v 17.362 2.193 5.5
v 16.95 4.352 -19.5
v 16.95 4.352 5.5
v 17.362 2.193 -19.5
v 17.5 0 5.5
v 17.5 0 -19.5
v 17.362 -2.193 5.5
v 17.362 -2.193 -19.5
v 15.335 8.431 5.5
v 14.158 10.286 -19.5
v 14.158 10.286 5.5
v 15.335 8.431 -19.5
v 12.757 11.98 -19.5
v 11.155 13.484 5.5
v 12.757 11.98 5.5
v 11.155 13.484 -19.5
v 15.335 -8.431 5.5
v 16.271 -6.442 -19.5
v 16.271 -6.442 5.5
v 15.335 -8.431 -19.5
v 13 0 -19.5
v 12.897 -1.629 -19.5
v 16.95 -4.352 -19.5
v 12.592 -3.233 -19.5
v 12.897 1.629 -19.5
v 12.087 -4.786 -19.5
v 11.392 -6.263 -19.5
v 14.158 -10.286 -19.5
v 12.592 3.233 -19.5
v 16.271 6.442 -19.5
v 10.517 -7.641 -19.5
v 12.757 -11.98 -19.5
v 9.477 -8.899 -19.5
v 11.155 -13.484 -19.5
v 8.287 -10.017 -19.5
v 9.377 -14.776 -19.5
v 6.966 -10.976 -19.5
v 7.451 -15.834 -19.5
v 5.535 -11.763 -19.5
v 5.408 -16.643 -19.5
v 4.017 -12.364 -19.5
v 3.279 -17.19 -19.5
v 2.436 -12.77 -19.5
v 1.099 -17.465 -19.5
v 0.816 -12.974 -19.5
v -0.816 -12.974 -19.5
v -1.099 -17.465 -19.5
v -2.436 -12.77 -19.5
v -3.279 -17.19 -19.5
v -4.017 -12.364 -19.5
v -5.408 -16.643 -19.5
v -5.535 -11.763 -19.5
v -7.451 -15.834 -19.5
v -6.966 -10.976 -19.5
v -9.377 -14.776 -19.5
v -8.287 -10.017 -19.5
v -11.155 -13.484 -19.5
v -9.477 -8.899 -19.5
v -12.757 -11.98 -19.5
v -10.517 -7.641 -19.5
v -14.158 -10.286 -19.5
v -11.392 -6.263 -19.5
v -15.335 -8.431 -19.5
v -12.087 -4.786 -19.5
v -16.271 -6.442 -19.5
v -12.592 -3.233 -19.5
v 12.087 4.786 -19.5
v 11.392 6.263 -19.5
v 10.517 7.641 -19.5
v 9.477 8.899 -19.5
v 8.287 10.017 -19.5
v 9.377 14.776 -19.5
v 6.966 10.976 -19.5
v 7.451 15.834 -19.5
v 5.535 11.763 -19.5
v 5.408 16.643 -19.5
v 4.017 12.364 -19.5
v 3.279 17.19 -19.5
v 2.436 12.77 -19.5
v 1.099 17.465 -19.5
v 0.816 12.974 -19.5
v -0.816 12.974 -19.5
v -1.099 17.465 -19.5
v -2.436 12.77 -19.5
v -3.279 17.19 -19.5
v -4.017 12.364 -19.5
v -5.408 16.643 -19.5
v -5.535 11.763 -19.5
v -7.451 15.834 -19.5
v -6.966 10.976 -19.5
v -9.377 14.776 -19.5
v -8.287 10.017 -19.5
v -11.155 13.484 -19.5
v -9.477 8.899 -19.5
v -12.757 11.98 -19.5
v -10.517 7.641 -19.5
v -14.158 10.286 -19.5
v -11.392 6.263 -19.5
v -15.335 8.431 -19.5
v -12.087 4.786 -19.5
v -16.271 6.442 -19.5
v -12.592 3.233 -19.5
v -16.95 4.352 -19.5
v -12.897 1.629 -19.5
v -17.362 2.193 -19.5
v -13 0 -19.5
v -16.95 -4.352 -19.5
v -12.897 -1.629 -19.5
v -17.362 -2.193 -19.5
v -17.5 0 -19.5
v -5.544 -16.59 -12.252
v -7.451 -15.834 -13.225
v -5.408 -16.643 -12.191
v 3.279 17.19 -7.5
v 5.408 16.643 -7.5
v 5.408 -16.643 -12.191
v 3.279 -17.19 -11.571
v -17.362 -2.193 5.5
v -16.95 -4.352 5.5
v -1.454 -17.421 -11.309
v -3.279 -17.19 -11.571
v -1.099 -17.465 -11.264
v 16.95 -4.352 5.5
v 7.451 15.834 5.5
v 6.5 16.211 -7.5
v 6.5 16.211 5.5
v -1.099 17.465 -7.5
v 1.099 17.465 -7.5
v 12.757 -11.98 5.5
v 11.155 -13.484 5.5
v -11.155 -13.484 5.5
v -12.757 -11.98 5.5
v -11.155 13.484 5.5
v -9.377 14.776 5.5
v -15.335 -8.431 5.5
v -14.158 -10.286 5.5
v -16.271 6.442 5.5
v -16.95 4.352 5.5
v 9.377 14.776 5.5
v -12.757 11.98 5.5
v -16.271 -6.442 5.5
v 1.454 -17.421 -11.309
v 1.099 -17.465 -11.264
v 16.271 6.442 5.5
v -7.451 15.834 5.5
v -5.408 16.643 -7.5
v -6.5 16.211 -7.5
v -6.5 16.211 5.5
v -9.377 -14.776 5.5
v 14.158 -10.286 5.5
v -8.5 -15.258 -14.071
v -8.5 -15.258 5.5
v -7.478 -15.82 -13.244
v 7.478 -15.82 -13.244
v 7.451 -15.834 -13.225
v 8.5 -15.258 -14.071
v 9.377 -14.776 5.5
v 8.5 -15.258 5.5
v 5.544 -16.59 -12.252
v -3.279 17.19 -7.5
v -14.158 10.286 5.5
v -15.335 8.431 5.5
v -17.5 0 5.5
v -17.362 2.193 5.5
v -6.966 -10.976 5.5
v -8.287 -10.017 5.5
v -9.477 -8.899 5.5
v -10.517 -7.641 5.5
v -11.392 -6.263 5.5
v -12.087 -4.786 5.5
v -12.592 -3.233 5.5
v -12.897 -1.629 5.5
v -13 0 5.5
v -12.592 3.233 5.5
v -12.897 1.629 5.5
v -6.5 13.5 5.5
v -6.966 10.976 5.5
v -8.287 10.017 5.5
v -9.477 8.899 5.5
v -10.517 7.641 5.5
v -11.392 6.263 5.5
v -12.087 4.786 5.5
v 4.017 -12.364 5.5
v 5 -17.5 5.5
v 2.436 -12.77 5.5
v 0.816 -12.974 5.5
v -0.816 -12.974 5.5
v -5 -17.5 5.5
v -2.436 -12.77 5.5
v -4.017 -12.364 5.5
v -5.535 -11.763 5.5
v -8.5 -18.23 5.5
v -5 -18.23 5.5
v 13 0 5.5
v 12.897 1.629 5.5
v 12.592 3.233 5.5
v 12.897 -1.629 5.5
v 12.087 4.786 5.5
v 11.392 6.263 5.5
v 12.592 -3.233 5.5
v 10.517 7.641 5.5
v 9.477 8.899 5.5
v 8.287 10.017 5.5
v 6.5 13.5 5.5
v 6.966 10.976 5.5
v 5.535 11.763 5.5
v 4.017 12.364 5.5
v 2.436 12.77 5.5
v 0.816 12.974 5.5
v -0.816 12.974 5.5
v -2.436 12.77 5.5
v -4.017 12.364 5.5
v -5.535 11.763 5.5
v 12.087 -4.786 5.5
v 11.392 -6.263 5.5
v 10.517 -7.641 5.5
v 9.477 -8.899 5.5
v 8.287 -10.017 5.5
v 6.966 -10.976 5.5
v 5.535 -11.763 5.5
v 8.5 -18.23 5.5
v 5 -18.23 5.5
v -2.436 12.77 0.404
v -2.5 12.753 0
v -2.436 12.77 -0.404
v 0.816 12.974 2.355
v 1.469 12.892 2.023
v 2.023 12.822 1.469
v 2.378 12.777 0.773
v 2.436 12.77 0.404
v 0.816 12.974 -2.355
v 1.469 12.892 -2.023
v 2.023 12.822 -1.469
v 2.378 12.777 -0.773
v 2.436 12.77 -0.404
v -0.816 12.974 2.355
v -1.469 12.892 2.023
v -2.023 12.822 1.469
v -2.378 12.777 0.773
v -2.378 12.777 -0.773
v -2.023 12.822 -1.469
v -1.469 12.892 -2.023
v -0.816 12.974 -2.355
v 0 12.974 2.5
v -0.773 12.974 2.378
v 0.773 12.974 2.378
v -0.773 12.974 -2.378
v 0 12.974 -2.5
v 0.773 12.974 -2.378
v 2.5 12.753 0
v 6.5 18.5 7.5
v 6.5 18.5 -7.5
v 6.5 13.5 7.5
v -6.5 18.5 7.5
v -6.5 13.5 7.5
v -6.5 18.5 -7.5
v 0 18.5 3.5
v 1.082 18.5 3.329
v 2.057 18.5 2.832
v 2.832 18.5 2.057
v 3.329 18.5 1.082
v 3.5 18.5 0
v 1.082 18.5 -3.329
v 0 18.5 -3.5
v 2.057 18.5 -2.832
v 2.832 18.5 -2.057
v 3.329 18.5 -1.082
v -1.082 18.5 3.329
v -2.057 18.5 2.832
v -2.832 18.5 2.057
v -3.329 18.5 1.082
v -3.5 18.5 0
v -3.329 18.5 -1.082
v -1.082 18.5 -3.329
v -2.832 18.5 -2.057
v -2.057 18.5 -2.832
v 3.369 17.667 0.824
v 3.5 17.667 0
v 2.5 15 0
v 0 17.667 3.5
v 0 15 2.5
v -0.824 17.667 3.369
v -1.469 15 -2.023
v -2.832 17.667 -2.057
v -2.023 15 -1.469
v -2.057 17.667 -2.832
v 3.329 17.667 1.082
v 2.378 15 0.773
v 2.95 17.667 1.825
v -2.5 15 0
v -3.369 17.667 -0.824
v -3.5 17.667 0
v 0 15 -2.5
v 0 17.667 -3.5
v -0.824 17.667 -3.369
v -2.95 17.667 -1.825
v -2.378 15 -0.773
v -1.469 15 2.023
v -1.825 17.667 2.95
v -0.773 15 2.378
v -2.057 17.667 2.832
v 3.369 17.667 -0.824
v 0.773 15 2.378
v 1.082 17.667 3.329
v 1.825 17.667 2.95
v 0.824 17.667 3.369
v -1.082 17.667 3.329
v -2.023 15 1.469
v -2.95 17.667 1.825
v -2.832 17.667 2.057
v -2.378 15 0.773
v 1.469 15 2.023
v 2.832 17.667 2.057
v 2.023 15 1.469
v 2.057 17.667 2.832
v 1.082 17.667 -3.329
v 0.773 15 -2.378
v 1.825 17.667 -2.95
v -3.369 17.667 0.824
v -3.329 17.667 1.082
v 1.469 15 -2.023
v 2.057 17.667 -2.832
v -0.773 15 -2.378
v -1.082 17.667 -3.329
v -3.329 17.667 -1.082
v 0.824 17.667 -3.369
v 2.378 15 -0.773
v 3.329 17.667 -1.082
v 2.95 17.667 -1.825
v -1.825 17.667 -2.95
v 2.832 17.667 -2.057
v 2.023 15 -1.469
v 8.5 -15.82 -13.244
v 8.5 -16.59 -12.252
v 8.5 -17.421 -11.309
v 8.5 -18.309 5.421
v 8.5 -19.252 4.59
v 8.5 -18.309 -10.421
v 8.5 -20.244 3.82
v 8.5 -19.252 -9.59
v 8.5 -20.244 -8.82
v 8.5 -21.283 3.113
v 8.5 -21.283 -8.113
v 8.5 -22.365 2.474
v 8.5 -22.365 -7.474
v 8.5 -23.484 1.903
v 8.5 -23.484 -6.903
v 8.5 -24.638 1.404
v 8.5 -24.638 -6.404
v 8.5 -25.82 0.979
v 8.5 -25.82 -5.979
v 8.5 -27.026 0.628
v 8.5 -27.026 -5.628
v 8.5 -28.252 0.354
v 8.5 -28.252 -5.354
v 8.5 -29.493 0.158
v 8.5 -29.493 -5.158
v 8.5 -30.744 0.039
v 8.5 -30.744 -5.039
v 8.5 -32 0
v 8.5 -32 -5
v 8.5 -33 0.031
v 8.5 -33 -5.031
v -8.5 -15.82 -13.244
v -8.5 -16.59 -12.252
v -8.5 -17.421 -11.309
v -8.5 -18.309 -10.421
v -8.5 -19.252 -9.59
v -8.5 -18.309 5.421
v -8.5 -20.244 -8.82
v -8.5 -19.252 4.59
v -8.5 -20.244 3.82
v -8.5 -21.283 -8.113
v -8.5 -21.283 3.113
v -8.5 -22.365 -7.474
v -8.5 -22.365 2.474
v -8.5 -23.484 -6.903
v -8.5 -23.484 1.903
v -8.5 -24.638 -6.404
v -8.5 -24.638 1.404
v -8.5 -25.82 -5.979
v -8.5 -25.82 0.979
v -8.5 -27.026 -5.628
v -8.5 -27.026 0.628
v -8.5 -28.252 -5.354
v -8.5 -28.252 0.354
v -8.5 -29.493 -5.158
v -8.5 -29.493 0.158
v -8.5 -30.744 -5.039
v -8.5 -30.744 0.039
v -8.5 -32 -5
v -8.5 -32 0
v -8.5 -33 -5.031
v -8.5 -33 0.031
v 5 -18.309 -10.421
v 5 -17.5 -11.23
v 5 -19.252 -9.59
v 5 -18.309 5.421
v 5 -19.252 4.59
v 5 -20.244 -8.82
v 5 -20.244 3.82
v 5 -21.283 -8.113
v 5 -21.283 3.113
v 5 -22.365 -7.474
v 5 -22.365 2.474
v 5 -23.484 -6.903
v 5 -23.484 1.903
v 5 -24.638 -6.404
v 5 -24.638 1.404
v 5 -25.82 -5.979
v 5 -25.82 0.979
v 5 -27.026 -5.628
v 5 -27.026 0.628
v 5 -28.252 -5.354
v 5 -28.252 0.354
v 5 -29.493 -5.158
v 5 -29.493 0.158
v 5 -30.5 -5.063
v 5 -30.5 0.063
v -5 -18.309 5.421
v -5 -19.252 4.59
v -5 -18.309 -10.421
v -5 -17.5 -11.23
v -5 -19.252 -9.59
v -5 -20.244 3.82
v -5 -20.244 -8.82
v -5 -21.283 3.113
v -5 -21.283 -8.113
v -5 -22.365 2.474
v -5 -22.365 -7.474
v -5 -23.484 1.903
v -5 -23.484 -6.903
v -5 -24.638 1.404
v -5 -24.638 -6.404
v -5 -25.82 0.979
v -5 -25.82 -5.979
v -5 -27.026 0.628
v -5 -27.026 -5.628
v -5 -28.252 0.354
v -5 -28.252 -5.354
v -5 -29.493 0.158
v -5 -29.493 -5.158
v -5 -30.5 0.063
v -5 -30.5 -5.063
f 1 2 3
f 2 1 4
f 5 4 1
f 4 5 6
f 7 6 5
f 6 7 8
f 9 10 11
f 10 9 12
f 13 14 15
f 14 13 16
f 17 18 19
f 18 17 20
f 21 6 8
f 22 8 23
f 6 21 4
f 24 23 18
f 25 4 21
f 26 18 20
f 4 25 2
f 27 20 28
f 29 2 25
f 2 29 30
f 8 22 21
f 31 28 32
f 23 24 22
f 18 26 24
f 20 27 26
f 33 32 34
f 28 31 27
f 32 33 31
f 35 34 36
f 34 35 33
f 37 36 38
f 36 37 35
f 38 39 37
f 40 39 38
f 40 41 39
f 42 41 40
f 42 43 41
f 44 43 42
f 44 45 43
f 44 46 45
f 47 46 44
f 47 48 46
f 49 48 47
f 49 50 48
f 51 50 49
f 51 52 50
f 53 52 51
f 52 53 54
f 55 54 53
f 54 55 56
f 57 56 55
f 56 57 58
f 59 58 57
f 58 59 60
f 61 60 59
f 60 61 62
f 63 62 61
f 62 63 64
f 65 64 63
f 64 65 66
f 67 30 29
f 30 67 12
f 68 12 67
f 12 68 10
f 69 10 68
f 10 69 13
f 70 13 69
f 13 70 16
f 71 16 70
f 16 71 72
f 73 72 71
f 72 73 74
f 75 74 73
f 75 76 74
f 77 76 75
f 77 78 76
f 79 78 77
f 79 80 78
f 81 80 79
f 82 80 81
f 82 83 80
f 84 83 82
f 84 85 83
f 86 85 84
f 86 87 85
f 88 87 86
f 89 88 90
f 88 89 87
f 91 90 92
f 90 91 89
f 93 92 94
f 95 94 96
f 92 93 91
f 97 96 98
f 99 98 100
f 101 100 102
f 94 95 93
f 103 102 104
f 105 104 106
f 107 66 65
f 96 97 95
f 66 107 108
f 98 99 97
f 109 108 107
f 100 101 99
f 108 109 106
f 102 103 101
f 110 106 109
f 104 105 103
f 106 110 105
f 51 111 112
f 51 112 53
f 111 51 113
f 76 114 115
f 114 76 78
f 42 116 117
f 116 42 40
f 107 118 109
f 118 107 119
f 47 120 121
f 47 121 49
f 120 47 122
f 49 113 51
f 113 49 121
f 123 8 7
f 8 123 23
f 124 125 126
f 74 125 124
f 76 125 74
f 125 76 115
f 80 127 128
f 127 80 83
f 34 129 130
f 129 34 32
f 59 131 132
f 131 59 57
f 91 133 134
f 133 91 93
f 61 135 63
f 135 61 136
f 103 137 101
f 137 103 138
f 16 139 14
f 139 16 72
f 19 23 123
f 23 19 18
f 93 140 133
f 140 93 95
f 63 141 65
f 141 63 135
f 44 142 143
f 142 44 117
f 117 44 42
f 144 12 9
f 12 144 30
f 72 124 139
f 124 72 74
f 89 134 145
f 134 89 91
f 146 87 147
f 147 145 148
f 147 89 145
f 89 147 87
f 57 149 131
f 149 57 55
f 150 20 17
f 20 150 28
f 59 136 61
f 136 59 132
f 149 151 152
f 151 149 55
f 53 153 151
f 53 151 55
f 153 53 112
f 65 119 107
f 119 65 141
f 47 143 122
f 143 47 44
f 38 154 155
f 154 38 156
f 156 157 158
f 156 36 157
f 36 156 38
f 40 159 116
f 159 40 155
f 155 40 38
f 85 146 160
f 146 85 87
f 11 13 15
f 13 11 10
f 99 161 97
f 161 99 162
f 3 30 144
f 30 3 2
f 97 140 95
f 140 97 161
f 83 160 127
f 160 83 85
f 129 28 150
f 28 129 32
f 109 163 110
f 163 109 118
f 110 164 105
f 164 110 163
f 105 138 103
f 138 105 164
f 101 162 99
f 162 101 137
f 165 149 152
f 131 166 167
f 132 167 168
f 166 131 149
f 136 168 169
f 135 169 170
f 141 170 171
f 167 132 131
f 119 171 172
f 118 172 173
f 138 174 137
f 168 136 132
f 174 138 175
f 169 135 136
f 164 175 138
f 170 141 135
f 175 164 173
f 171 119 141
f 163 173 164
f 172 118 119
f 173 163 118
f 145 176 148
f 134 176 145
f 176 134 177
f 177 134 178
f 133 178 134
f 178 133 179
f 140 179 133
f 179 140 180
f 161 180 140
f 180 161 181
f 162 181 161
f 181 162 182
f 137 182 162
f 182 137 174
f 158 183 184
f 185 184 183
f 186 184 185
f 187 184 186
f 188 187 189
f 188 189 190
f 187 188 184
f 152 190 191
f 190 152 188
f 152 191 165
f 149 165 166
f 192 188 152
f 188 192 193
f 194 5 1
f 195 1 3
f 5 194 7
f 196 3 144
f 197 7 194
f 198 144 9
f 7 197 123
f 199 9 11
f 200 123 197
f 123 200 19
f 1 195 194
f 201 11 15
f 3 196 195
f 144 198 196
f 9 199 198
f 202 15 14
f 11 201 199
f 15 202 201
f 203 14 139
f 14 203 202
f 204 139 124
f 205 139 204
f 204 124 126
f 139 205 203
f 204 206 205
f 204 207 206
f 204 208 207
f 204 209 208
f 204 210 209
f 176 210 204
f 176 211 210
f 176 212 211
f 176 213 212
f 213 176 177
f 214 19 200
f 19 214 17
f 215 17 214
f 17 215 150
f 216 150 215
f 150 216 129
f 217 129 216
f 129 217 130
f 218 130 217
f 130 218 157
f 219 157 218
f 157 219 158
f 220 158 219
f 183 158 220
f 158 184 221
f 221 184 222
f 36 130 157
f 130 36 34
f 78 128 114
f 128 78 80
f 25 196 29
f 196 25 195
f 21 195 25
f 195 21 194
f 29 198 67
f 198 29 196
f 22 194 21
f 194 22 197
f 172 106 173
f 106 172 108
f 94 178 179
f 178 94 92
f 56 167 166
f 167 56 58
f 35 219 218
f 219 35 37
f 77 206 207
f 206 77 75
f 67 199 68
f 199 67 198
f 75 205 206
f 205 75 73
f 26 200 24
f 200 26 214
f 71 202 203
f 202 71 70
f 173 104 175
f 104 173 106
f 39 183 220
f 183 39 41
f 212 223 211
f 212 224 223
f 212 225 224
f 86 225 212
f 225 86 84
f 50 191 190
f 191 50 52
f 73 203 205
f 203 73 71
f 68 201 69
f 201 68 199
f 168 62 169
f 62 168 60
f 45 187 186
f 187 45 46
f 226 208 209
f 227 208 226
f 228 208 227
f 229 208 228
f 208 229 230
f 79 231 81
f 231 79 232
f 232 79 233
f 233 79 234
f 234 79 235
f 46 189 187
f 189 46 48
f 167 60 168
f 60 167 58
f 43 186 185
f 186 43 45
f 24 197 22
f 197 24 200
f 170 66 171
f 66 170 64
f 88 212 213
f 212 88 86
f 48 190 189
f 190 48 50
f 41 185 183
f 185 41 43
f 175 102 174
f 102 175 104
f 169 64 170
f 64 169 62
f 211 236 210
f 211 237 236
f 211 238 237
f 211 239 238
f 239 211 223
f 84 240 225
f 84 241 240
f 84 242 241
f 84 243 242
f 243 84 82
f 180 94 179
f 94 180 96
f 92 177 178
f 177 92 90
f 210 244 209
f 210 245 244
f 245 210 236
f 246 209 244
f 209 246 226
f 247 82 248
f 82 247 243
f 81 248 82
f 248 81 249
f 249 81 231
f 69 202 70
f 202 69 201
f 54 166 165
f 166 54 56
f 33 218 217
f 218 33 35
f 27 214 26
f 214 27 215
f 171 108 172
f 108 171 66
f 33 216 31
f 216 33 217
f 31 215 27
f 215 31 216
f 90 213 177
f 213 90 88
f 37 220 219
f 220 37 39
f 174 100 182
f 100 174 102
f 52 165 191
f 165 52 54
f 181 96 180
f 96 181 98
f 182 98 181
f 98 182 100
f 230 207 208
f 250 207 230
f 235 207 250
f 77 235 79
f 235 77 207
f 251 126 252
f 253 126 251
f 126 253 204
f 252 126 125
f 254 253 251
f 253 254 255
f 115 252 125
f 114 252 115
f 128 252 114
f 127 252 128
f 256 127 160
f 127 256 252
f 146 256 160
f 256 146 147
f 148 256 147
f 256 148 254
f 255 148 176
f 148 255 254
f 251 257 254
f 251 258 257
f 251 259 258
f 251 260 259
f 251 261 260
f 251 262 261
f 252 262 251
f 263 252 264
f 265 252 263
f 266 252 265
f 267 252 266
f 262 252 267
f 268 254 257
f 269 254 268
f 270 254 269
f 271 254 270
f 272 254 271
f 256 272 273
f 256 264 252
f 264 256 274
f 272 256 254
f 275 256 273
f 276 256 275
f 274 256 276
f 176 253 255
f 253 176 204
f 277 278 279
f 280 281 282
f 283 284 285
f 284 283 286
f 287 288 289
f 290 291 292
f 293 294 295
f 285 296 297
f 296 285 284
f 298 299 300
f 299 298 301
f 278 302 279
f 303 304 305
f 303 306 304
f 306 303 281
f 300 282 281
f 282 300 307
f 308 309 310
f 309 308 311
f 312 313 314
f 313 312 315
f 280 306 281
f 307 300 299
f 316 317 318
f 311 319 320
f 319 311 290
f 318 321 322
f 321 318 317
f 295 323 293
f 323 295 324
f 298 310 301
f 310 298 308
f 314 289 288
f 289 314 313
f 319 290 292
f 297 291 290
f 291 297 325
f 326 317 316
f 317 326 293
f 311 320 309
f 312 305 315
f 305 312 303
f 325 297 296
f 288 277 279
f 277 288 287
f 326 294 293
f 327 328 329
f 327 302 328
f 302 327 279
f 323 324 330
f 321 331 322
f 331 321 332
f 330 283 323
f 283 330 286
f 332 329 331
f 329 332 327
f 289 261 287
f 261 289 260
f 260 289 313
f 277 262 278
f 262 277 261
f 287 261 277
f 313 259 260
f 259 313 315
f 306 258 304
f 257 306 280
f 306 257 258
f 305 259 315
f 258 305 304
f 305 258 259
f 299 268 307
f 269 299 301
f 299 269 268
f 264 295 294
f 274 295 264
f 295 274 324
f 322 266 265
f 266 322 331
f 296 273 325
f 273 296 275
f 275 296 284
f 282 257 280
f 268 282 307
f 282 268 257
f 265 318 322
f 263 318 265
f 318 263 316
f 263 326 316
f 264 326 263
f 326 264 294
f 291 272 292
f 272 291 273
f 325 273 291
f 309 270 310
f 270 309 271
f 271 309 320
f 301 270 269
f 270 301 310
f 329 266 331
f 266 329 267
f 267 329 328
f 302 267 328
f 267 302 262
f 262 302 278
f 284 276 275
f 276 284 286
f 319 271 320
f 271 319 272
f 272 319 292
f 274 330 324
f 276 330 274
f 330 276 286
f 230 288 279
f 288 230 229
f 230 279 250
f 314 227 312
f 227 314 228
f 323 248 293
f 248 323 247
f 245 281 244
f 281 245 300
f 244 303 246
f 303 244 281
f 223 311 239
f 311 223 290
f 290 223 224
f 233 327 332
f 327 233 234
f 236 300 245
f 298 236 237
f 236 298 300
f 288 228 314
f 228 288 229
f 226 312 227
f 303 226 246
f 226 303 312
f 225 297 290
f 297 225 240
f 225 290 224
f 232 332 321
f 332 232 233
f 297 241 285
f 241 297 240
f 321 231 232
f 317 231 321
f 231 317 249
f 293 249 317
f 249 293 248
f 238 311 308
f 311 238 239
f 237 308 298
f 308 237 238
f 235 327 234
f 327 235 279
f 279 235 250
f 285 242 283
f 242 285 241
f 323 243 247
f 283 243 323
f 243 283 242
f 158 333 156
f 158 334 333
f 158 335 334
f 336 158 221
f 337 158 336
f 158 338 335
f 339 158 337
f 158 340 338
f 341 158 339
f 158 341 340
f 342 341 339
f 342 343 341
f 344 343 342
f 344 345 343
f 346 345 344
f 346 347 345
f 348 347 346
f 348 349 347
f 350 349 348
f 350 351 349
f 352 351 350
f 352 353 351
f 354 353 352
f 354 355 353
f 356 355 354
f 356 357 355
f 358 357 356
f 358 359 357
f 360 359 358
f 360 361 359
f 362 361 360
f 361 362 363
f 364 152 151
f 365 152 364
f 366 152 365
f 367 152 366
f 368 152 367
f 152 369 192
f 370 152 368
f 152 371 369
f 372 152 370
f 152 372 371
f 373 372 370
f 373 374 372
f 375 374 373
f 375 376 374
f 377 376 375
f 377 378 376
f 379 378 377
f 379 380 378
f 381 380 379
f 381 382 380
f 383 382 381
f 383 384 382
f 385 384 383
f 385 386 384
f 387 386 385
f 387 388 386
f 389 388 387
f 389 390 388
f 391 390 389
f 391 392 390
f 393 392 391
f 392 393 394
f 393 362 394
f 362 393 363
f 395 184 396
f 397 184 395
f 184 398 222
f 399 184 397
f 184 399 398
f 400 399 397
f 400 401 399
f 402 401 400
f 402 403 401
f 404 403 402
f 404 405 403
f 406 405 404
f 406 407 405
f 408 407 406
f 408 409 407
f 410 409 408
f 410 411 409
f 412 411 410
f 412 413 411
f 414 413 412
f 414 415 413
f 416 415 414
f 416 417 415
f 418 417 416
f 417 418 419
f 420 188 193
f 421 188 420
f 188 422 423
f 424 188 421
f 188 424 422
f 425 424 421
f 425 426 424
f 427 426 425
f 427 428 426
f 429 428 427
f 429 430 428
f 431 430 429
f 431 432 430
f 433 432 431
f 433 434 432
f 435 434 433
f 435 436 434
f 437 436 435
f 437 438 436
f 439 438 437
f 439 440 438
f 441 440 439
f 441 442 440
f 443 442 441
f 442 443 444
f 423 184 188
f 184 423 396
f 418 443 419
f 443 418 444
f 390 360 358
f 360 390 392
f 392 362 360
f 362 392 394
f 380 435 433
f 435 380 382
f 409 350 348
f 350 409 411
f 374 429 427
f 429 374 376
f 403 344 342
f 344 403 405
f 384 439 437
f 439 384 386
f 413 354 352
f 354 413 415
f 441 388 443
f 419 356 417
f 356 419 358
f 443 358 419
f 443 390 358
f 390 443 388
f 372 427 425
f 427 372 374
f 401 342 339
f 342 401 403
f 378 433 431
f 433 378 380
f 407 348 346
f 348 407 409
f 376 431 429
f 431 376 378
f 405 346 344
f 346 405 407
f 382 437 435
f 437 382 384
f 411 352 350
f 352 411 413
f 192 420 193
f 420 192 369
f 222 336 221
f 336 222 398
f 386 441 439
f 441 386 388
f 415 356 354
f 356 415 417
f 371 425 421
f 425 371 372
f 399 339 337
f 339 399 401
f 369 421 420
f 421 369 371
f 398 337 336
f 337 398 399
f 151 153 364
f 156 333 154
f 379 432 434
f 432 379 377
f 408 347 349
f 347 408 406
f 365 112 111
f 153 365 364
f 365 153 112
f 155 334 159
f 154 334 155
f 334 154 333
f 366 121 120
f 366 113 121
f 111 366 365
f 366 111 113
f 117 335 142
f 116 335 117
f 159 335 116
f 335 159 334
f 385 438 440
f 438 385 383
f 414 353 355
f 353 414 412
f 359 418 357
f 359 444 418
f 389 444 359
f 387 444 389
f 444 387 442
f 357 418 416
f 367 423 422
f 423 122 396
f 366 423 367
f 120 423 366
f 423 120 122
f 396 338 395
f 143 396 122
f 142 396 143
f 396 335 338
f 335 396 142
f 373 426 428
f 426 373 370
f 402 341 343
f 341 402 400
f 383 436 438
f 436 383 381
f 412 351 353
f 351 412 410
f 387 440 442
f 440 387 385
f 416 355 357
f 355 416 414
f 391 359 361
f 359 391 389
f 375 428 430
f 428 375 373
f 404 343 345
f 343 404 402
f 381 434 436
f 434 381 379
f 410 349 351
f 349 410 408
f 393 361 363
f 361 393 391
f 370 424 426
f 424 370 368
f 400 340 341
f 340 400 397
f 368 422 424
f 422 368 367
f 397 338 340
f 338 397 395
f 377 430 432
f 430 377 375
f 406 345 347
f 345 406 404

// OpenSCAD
difference() {

    union() {
// Manchon
        difference() {
            translate([0,0,-7]) cylinder(r=35/2,h=25,center=true,$fn=50);
            cylinder(r=26/2,h=50,center=true,$fn=50);
        };

// Renfort vis
        translate([0,16,0]) cube([13,5,15], center=true);
    }

// Trou vis
    translate([0,16,0]) rotate([90,0,0]) cylinder(r=5/2,h=10,center=true,$fn=20);
    translate([0,17,0]) rotate([90,0,0]) intersection() {
       cylinder(r2=5/2,r1=8/2,h=4,center=true,$fn=20);
       cylinder(r=7/2,h=4,center=true,$fn=20);
    }
    
}

// Accroche sangle
difference() {
    translate([0,-23,-4.5]) cube([17,20,20], center=true);
    
// Percement vertical
    translate([0,-24,-7.5]) cube([10,13,30], center=true);

// Arrondi supérieur
    translate([0,-32,20]) rotate([0,90,0]) cylinder(r=20,h=20,center=true,$fn=100);

// Arrondi inférieur
    translate([0,-32,-25]) rotate([0,90,0]) cylinder(r=20,h=20,center=true,$fn=100);
    
}
